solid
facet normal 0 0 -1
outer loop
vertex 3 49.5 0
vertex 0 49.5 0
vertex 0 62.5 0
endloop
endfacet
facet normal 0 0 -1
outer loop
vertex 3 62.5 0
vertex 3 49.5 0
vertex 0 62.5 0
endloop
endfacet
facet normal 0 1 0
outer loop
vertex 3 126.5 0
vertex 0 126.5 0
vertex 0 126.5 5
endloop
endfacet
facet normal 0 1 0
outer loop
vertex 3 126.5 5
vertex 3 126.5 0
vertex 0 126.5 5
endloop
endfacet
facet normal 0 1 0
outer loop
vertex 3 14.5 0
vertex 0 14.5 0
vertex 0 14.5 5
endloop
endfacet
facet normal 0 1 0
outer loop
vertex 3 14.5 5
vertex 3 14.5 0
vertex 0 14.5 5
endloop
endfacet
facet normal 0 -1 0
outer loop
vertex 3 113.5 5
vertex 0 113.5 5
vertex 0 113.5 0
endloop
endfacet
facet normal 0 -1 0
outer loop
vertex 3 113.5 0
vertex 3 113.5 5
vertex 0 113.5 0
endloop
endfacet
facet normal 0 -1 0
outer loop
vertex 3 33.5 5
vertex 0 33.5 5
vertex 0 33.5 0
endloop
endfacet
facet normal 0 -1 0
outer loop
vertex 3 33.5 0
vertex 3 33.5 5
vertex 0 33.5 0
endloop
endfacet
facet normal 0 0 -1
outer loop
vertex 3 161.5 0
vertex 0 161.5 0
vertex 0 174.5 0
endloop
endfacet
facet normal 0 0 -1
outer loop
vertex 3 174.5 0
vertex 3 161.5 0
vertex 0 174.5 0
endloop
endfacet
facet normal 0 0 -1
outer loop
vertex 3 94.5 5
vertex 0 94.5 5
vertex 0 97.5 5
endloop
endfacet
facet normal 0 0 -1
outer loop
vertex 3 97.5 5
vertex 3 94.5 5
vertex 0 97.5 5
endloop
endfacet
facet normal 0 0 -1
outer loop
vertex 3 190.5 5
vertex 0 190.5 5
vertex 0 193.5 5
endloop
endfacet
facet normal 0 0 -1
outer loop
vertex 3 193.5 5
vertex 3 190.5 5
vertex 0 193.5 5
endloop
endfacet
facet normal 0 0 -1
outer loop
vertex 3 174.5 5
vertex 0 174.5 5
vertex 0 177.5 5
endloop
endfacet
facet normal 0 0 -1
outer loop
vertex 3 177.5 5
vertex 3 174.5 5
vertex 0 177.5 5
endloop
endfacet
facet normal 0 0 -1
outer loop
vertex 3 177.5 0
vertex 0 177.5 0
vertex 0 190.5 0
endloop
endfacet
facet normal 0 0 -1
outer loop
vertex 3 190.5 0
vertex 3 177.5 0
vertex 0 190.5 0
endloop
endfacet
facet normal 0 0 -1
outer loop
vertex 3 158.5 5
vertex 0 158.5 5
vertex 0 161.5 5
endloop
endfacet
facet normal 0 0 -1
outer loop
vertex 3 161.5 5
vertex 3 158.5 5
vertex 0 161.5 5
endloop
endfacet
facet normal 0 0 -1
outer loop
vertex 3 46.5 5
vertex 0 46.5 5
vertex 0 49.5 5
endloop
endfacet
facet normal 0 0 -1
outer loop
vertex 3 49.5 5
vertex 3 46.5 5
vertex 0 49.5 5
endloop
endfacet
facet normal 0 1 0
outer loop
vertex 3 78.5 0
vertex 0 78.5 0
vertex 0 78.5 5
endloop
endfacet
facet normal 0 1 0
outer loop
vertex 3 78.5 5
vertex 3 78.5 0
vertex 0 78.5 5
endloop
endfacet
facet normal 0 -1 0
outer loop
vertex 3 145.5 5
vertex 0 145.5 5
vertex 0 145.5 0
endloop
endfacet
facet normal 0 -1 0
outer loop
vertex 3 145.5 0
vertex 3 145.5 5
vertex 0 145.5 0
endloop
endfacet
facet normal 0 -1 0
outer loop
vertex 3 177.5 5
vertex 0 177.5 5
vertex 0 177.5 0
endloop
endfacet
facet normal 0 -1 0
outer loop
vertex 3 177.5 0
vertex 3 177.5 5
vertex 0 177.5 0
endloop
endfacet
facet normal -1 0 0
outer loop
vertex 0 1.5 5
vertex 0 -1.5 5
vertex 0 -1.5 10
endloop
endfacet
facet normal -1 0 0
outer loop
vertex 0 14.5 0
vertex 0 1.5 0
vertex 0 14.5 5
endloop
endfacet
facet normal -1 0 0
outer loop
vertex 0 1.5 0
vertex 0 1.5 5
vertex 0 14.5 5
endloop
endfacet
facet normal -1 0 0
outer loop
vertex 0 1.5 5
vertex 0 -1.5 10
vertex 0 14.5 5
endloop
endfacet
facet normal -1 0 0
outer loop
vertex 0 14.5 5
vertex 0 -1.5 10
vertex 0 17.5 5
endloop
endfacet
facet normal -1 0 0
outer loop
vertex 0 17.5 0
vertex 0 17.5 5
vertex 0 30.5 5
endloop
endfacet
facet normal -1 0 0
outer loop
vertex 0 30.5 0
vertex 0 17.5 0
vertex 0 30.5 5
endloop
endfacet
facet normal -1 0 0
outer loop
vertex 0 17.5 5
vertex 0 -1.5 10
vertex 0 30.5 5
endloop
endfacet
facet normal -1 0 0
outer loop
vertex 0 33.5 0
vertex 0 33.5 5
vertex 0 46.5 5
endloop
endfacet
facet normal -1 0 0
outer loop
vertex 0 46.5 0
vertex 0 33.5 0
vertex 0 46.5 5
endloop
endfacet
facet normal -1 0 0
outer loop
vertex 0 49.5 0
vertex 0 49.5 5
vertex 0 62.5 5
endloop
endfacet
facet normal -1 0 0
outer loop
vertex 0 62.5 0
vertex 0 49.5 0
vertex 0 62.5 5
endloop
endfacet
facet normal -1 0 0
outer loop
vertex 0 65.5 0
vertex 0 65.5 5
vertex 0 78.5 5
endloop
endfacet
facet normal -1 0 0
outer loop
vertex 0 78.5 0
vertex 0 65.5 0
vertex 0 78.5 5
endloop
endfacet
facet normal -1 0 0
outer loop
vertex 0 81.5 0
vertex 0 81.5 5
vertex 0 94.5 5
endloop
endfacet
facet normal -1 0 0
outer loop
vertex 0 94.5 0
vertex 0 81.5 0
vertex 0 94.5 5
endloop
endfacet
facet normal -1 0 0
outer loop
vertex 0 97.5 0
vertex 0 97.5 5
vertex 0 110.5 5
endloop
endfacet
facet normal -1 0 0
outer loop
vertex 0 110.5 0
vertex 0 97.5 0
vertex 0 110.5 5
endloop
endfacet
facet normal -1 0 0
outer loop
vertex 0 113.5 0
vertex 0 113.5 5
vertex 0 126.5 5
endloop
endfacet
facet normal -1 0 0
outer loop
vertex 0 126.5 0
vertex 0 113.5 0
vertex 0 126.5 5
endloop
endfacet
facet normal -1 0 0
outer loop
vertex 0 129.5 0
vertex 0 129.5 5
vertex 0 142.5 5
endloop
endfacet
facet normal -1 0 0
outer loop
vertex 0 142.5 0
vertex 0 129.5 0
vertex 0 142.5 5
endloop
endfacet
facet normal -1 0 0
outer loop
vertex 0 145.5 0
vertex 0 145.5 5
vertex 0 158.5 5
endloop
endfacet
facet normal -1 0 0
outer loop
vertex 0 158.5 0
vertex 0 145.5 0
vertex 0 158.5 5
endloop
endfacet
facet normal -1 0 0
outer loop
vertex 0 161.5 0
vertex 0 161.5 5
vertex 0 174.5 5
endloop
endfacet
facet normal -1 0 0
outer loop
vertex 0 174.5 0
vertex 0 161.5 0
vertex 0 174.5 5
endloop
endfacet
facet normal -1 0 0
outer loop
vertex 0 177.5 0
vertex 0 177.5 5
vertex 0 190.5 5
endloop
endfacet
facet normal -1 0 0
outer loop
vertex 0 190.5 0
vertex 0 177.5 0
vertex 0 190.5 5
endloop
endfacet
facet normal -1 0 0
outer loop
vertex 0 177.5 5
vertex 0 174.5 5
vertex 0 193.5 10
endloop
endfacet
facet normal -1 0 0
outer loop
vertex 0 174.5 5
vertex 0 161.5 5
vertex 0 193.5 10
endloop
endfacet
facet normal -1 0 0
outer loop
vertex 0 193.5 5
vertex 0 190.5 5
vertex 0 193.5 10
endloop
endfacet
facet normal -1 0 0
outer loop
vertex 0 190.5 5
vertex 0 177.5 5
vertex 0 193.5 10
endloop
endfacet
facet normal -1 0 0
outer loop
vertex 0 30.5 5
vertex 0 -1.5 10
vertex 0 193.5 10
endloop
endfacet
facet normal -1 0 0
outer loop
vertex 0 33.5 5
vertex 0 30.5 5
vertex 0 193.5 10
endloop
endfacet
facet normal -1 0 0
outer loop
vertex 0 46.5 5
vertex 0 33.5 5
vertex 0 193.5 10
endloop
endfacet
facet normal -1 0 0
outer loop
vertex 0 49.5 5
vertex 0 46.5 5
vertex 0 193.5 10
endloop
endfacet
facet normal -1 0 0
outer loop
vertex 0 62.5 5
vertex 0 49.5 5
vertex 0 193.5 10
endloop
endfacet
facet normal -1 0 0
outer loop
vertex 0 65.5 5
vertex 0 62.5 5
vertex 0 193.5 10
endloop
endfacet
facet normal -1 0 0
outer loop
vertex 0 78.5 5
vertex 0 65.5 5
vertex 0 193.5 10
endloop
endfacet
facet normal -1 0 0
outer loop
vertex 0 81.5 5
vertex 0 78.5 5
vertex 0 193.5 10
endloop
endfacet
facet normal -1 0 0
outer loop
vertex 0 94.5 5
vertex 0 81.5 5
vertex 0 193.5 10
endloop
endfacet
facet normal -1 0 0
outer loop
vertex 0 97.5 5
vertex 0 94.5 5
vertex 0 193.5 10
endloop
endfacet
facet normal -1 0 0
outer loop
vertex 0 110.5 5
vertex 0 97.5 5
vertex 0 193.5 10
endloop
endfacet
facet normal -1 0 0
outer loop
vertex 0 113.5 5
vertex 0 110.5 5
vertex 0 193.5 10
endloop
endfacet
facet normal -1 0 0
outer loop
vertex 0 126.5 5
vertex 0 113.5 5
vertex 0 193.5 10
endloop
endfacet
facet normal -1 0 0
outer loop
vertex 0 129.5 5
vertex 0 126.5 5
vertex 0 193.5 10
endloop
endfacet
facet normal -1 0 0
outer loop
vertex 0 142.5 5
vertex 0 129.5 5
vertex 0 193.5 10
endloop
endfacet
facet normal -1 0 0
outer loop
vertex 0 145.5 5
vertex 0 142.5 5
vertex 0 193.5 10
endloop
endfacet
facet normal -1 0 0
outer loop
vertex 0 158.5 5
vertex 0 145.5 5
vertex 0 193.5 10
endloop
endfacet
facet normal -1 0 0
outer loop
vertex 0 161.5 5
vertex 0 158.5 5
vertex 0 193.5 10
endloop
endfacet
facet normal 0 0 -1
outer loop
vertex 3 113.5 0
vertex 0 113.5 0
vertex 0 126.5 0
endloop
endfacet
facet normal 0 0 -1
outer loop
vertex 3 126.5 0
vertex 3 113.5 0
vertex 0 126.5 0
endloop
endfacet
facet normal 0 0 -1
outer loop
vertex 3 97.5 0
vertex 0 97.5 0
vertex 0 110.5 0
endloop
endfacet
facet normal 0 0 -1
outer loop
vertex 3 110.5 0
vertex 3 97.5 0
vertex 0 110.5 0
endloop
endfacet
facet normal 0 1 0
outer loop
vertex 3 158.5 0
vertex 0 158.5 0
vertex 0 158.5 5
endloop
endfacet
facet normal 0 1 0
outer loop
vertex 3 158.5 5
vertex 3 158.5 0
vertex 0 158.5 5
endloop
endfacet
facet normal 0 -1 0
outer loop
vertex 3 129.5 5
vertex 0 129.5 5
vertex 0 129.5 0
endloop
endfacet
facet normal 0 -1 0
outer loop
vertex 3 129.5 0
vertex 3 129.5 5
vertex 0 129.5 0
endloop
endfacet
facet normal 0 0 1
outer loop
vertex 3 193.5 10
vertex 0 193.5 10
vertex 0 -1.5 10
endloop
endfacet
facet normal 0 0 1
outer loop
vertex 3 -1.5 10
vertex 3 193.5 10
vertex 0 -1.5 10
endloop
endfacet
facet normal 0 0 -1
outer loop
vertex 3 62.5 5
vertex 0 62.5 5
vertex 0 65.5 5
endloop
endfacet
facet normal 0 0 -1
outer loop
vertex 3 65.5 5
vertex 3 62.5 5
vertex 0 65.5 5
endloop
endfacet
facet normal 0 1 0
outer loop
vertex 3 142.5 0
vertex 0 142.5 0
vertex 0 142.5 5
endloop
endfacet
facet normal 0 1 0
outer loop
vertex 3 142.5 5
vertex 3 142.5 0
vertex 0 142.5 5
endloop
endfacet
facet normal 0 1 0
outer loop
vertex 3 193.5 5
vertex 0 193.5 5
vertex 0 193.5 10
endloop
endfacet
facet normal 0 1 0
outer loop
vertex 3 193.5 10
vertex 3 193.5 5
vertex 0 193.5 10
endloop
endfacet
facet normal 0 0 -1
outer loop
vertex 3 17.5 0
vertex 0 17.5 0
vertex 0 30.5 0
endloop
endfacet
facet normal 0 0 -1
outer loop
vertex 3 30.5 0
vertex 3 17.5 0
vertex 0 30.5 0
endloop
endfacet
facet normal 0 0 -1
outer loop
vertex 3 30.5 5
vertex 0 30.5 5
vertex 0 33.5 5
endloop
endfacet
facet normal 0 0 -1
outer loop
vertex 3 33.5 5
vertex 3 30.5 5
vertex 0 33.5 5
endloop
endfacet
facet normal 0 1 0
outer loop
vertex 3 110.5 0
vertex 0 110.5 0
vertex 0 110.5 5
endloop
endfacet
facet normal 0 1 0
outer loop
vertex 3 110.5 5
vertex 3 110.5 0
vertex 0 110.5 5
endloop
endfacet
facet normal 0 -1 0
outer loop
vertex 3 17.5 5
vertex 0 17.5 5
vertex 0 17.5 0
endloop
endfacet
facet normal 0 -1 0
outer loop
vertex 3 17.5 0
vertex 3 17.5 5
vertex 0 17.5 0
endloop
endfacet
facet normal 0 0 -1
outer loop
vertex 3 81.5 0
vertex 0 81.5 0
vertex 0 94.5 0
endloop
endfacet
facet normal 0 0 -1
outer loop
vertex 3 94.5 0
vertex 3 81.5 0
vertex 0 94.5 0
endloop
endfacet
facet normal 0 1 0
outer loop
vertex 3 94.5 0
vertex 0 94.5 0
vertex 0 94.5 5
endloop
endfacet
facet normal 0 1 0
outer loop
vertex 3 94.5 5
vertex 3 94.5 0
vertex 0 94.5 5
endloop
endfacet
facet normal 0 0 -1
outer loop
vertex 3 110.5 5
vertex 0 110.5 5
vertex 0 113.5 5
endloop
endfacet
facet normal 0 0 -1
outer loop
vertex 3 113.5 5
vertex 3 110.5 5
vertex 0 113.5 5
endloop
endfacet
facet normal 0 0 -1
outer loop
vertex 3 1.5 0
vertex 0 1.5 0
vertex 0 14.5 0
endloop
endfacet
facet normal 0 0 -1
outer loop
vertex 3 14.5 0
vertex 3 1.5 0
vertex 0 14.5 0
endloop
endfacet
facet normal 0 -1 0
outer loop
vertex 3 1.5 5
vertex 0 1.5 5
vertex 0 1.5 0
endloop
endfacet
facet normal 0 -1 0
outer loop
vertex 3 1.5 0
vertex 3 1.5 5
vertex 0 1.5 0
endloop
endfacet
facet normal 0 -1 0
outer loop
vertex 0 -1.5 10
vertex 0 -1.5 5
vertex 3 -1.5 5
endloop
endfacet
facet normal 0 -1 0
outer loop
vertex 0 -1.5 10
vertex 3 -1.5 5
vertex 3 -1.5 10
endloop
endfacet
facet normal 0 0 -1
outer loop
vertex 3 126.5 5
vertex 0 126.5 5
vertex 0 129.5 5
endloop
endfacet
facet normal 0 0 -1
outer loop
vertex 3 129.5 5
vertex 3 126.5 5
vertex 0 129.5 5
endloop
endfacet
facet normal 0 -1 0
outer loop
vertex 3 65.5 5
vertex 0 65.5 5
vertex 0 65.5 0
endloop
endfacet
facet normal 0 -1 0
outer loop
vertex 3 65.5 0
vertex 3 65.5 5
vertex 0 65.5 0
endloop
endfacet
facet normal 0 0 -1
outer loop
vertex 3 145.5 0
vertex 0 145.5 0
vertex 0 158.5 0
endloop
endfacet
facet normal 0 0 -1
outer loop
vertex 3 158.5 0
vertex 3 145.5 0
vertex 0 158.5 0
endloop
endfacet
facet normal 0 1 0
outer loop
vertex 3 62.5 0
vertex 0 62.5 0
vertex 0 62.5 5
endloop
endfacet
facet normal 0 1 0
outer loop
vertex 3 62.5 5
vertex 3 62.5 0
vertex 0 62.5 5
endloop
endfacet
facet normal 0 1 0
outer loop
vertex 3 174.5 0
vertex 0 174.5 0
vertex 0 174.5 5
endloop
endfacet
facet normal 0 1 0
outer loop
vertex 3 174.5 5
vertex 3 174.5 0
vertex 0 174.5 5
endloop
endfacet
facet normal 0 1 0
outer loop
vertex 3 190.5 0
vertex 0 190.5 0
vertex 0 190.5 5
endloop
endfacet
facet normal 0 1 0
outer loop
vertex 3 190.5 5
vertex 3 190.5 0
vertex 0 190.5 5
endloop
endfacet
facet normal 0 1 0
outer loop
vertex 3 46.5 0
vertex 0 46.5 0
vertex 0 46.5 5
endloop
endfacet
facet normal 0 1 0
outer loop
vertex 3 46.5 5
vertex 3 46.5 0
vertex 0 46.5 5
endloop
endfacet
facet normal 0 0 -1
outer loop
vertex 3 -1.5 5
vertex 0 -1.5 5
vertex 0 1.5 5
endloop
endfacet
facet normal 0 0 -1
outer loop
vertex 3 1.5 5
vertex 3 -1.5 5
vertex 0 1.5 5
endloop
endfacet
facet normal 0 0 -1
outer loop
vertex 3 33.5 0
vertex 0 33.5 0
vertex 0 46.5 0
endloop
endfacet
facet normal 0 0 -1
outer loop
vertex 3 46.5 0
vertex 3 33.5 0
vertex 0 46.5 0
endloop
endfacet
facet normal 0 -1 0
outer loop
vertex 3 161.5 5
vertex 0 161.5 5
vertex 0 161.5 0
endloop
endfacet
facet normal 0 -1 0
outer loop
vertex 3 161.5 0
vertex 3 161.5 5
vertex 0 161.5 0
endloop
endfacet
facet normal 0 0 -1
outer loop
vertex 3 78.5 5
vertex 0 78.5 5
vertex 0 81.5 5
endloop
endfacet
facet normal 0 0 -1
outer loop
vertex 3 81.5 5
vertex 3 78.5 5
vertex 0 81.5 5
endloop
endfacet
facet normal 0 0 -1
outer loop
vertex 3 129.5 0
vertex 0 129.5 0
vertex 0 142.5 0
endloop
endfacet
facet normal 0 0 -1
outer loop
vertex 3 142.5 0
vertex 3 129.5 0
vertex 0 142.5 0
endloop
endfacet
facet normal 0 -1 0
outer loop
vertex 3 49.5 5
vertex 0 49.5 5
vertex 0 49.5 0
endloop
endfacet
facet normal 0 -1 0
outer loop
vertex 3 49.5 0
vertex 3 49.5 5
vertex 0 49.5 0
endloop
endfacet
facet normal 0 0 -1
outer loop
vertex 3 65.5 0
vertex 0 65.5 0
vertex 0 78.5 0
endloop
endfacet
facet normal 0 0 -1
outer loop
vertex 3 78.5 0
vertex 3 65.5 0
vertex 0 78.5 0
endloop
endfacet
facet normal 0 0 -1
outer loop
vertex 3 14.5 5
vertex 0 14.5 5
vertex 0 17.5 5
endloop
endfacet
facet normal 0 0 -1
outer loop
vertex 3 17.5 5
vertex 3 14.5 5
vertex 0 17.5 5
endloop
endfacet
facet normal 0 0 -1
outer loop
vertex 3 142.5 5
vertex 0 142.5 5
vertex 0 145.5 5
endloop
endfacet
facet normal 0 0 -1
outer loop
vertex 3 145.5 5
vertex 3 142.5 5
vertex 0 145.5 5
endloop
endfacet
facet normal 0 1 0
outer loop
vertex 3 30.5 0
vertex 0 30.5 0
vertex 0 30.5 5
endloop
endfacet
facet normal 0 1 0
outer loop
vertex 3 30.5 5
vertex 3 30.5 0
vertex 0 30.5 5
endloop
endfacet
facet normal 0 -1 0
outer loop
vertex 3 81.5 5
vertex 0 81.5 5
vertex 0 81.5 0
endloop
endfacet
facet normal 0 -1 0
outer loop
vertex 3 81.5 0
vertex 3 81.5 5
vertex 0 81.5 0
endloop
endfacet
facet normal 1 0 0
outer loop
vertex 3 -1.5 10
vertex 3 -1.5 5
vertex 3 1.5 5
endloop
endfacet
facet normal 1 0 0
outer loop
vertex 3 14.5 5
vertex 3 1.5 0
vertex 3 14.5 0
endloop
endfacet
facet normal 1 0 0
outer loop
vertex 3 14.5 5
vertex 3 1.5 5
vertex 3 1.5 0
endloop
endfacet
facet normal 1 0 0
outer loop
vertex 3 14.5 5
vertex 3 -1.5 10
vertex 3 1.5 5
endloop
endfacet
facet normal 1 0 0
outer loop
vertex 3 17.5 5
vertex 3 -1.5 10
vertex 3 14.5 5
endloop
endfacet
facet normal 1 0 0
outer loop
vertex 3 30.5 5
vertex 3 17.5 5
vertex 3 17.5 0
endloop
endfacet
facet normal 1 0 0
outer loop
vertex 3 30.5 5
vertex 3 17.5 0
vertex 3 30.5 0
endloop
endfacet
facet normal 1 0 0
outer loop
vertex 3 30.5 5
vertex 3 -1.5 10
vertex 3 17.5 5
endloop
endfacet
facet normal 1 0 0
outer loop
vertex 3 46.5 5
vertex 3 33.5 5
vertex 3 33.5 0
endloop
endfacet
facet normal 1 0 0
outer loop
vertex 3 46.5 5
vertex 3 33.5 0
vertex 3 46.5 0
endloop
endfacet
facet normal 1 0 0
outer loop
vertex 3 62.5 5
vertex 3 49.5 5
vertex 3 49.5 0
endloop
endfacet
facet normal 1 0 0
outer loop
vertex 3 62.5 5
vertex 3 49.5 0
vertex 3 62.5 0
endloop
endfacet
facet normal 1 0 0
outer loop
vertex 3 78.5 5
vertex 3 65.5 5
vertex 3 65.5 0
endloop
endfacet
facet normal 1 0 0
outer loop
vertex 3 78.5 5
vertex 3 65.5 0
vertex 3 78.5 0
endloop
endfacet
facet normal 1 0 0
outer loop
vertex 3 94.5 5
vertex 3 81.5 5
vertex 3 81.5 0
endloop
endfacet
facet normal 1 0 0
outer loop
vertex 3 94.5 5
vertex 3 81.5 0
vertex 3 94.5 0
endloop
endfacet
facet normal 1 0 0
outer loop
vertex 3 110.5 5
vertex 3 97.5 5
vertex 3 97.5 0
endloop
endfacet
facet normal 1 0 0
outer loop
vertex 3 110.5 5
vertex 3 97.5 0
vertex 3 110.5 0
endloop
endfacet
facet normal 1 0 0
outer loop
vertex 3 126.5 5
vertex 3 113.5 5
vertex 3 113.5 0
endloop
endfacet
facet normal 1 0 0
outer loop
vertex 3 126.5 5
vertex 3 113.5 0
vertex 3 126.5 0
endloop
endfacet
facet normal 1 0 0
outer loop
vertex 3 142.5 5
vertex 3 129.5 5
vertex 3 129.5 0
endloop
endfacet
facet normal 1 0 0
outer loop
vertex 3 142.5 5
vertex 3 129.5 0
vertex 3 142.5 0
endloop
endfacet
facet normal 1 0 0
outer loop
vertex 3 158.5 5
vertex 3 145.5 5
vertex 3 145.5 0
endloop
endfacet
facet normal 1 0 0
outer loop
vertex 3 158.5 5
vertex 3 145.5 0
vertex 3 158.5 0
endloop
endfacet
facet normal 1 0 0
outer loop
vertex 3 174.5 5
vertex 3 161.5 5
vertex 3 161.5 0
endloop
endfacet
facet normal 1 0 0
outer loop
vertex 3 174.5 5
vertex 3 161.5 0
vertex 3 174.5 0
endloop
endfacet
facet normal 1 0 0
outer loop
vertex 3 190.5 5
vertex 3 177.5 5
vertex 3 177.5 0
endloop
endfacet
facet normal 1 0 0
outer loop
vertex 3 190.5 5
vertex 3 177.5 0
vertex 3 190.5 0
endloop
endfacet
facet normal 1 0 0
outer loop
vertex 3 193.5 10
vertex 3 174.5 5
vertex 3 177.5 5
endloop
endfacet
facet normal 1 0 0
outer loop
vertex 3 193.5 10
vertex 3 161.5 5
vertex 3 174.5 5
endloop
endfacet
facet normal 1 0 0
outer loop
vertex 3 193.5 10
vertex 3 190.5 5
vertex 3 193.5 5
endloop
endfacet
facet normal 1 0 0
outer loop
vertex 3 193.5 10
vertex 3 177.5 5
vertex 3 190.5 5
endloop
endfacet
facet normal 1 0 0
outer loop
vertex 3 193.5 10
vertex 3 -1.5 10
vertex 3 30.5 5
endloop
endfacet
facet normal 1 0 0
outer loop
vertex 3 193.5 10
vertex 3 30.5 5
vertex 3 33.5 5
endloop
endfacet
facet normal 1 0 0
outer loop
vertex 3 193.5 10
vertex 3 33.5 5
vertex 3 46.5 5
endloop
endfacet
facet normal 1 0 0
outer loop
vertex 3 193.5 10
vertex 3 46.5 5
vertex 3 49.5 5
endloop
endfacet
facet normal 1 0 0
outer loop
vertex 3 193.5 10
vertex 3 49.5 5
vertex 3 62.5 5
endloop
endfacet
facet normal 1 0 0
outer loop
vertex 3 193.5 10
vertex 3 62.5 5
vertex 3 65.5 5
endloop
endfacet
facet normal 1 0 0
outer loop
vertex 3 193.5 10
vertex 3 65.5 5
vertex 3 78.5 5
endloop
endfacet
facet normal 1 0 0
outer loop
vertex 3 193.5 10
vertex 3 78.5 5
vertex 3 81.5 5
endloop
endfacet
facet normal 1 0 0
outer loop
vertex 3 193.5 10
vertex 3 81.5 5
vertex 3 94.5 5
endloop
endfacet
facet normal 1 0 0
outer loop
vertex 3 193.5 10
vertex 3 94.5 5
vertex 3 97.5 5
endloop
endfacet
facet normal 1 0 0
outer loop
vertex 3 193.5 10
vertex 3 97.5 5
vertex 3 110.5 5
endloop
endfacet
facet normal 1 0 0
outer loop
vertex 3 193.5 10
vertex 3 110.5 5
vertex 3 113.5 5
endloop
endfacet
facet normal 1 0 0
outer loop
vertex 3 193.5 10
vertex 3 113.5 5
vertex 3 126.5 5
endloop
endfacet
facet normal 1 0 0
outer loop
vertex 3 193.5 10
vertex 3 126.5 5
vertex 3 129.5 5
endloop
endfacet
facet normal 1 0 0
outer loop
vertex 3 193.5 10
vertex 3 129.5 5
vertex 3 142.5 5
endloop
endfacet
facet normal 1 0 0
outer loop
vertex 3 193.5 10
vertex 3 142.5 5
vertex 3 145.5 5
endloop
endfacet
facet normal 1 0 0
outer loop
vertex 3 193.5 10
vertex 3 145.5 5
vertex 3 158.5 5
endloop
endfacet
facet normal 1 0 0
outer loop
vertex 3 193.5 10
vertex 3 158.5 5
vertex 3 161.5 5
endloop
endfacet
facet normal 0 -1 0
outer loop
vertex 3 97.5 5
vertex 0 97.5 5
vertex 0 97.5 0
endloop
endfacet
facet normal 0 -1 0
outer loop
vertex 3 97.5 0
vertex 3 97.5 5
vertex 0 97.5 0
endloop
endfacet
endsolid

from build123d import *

# Parameters (mm, degrees)
F0_W     = 1.5
F0_H     = 5
F0_W_2   = 3
F1_DEPTH = 3


with BuildPart() as f1:
    # F0 (on Right) → F1 (new body)
    with BuildSketch(Plane.YZ):
        Polygon((1.5, 5), (1.5, 0), (11.5, 0), (14.5, 0), (14.5, 5), (14.5, 10), (11.5, 10), (1.5, 10), align=None)
        Polygon((17.5, 5), (17.5, 0), (20.5, 0), (30.5, 0), (30.5, 5), (30.5, 10), (20.5, 10), (17.5, 10), align=None)
        with Locations((0.75, 7.5)):
            Rectangle(F0_W, F0_H)
        with Locations((-0.75, 7.5)):
            Rectangle(F0_W, F0_H)
        with Locations((16, 7.5)):
            Rectangle(F0_W_2, F0_H)
        with Locations((32, 7.5)):
            Rectangle(F0_W_2, F0_H)
        with Locations((48, 7.5)):
            Rectangle(F0_W_2, F0_H)
        with Locations((64, 7.5)):
            Rectangle(F0_W_2, F0_H)
        with Locations((80, 7.5)):
            Rectangle(F0_W_2, F0_H)
        with Locations((95.25, 7.5)):
            Rectangle(F0_W, F0_H)
        with Locations((96.75, 7.5)):
            Rectangle(F0_W, F0_H)
        with Locations((112, 7.5)):
            Rectangle(F0_W_2, F0_H)
        with Locations((128, 7.5)):
            Rectangle(F0_W_2, F0_H)
        with Locations((144, 7.5)):
            Rectangle(F0_W_2, F0_H)
        with Locations((160, 7.5)):
            Rectangle(F0_W_2, F0_H)
        with Locations((176, 7.5)):
            Rectangle(F0_W_2, F0_H)
        with Locations((191.25, 7.5)):
            Rectangle(F0_W, F0_H)
        with Locations((192.75, 7.5)):
            Rectangle(F0_W, F0_H)
        Polygon((33.5, 5), (33.5, 0), (43.5, 0), (46.5, 0), (46.5, 5), (46.5, 10), (33.5, 10), align=None)
        Polygon((49.5, 5), (49.5, 0), (52.5, 0), (62.5, 0), (62.5, 5), (62.5, 10), (49.5, 10), align=None)
        Polygon((78.5, 10), (65.5, 10), (65.5, 5), (65.5, 0), (75.5, 0), (78.5, 0), (78.5, 5), align=None)
        Polygon((94.5, 10), (81.5, 10), (81.5, 5), (81.5, 0), (84.5, 0), (94.5, 0), (94.5, 5), align=None)
        Polygon((110.5, 10), (97.5, 10), (97.5, 5), (97.5, 0), (107.5, 0), (110.5, 0), (110.5, 5), align=None)
        Polygon((126.5, 10), (113.5, 10), (113.5, 5), (113.5, 0), (116.5, 0), (126.5, 0), (126.5, 5), align=None)
        Polygon((142.5, 10), (129.5, 10), (129.5, 5), (129.5, 0), (139.5, 0), (142.5, 0), (142.5, 5), align=None)
        Polygon((158.5, 10), (145.5, 10), (145.5, 5), (145.5, 0), (148.5, 0), (158.5, 0), (158.5, 5), align=None)
        Polygon((171.5, 10), (161.5, 10), (161.5, 5), (161.5, 0), (171.5, 0), (174.5, 0), (174.5, 5), (174.5, 10), align=None)
        Polygon((180.5, 10), (177.5, 10), (177.5, 5), (177.5, 0), (180.5, 0), (190.5, 0), (190.5, 5), (190.5, 10), align=None)
    extrude(amount=F1_DEPTH)


solid = f1.part
